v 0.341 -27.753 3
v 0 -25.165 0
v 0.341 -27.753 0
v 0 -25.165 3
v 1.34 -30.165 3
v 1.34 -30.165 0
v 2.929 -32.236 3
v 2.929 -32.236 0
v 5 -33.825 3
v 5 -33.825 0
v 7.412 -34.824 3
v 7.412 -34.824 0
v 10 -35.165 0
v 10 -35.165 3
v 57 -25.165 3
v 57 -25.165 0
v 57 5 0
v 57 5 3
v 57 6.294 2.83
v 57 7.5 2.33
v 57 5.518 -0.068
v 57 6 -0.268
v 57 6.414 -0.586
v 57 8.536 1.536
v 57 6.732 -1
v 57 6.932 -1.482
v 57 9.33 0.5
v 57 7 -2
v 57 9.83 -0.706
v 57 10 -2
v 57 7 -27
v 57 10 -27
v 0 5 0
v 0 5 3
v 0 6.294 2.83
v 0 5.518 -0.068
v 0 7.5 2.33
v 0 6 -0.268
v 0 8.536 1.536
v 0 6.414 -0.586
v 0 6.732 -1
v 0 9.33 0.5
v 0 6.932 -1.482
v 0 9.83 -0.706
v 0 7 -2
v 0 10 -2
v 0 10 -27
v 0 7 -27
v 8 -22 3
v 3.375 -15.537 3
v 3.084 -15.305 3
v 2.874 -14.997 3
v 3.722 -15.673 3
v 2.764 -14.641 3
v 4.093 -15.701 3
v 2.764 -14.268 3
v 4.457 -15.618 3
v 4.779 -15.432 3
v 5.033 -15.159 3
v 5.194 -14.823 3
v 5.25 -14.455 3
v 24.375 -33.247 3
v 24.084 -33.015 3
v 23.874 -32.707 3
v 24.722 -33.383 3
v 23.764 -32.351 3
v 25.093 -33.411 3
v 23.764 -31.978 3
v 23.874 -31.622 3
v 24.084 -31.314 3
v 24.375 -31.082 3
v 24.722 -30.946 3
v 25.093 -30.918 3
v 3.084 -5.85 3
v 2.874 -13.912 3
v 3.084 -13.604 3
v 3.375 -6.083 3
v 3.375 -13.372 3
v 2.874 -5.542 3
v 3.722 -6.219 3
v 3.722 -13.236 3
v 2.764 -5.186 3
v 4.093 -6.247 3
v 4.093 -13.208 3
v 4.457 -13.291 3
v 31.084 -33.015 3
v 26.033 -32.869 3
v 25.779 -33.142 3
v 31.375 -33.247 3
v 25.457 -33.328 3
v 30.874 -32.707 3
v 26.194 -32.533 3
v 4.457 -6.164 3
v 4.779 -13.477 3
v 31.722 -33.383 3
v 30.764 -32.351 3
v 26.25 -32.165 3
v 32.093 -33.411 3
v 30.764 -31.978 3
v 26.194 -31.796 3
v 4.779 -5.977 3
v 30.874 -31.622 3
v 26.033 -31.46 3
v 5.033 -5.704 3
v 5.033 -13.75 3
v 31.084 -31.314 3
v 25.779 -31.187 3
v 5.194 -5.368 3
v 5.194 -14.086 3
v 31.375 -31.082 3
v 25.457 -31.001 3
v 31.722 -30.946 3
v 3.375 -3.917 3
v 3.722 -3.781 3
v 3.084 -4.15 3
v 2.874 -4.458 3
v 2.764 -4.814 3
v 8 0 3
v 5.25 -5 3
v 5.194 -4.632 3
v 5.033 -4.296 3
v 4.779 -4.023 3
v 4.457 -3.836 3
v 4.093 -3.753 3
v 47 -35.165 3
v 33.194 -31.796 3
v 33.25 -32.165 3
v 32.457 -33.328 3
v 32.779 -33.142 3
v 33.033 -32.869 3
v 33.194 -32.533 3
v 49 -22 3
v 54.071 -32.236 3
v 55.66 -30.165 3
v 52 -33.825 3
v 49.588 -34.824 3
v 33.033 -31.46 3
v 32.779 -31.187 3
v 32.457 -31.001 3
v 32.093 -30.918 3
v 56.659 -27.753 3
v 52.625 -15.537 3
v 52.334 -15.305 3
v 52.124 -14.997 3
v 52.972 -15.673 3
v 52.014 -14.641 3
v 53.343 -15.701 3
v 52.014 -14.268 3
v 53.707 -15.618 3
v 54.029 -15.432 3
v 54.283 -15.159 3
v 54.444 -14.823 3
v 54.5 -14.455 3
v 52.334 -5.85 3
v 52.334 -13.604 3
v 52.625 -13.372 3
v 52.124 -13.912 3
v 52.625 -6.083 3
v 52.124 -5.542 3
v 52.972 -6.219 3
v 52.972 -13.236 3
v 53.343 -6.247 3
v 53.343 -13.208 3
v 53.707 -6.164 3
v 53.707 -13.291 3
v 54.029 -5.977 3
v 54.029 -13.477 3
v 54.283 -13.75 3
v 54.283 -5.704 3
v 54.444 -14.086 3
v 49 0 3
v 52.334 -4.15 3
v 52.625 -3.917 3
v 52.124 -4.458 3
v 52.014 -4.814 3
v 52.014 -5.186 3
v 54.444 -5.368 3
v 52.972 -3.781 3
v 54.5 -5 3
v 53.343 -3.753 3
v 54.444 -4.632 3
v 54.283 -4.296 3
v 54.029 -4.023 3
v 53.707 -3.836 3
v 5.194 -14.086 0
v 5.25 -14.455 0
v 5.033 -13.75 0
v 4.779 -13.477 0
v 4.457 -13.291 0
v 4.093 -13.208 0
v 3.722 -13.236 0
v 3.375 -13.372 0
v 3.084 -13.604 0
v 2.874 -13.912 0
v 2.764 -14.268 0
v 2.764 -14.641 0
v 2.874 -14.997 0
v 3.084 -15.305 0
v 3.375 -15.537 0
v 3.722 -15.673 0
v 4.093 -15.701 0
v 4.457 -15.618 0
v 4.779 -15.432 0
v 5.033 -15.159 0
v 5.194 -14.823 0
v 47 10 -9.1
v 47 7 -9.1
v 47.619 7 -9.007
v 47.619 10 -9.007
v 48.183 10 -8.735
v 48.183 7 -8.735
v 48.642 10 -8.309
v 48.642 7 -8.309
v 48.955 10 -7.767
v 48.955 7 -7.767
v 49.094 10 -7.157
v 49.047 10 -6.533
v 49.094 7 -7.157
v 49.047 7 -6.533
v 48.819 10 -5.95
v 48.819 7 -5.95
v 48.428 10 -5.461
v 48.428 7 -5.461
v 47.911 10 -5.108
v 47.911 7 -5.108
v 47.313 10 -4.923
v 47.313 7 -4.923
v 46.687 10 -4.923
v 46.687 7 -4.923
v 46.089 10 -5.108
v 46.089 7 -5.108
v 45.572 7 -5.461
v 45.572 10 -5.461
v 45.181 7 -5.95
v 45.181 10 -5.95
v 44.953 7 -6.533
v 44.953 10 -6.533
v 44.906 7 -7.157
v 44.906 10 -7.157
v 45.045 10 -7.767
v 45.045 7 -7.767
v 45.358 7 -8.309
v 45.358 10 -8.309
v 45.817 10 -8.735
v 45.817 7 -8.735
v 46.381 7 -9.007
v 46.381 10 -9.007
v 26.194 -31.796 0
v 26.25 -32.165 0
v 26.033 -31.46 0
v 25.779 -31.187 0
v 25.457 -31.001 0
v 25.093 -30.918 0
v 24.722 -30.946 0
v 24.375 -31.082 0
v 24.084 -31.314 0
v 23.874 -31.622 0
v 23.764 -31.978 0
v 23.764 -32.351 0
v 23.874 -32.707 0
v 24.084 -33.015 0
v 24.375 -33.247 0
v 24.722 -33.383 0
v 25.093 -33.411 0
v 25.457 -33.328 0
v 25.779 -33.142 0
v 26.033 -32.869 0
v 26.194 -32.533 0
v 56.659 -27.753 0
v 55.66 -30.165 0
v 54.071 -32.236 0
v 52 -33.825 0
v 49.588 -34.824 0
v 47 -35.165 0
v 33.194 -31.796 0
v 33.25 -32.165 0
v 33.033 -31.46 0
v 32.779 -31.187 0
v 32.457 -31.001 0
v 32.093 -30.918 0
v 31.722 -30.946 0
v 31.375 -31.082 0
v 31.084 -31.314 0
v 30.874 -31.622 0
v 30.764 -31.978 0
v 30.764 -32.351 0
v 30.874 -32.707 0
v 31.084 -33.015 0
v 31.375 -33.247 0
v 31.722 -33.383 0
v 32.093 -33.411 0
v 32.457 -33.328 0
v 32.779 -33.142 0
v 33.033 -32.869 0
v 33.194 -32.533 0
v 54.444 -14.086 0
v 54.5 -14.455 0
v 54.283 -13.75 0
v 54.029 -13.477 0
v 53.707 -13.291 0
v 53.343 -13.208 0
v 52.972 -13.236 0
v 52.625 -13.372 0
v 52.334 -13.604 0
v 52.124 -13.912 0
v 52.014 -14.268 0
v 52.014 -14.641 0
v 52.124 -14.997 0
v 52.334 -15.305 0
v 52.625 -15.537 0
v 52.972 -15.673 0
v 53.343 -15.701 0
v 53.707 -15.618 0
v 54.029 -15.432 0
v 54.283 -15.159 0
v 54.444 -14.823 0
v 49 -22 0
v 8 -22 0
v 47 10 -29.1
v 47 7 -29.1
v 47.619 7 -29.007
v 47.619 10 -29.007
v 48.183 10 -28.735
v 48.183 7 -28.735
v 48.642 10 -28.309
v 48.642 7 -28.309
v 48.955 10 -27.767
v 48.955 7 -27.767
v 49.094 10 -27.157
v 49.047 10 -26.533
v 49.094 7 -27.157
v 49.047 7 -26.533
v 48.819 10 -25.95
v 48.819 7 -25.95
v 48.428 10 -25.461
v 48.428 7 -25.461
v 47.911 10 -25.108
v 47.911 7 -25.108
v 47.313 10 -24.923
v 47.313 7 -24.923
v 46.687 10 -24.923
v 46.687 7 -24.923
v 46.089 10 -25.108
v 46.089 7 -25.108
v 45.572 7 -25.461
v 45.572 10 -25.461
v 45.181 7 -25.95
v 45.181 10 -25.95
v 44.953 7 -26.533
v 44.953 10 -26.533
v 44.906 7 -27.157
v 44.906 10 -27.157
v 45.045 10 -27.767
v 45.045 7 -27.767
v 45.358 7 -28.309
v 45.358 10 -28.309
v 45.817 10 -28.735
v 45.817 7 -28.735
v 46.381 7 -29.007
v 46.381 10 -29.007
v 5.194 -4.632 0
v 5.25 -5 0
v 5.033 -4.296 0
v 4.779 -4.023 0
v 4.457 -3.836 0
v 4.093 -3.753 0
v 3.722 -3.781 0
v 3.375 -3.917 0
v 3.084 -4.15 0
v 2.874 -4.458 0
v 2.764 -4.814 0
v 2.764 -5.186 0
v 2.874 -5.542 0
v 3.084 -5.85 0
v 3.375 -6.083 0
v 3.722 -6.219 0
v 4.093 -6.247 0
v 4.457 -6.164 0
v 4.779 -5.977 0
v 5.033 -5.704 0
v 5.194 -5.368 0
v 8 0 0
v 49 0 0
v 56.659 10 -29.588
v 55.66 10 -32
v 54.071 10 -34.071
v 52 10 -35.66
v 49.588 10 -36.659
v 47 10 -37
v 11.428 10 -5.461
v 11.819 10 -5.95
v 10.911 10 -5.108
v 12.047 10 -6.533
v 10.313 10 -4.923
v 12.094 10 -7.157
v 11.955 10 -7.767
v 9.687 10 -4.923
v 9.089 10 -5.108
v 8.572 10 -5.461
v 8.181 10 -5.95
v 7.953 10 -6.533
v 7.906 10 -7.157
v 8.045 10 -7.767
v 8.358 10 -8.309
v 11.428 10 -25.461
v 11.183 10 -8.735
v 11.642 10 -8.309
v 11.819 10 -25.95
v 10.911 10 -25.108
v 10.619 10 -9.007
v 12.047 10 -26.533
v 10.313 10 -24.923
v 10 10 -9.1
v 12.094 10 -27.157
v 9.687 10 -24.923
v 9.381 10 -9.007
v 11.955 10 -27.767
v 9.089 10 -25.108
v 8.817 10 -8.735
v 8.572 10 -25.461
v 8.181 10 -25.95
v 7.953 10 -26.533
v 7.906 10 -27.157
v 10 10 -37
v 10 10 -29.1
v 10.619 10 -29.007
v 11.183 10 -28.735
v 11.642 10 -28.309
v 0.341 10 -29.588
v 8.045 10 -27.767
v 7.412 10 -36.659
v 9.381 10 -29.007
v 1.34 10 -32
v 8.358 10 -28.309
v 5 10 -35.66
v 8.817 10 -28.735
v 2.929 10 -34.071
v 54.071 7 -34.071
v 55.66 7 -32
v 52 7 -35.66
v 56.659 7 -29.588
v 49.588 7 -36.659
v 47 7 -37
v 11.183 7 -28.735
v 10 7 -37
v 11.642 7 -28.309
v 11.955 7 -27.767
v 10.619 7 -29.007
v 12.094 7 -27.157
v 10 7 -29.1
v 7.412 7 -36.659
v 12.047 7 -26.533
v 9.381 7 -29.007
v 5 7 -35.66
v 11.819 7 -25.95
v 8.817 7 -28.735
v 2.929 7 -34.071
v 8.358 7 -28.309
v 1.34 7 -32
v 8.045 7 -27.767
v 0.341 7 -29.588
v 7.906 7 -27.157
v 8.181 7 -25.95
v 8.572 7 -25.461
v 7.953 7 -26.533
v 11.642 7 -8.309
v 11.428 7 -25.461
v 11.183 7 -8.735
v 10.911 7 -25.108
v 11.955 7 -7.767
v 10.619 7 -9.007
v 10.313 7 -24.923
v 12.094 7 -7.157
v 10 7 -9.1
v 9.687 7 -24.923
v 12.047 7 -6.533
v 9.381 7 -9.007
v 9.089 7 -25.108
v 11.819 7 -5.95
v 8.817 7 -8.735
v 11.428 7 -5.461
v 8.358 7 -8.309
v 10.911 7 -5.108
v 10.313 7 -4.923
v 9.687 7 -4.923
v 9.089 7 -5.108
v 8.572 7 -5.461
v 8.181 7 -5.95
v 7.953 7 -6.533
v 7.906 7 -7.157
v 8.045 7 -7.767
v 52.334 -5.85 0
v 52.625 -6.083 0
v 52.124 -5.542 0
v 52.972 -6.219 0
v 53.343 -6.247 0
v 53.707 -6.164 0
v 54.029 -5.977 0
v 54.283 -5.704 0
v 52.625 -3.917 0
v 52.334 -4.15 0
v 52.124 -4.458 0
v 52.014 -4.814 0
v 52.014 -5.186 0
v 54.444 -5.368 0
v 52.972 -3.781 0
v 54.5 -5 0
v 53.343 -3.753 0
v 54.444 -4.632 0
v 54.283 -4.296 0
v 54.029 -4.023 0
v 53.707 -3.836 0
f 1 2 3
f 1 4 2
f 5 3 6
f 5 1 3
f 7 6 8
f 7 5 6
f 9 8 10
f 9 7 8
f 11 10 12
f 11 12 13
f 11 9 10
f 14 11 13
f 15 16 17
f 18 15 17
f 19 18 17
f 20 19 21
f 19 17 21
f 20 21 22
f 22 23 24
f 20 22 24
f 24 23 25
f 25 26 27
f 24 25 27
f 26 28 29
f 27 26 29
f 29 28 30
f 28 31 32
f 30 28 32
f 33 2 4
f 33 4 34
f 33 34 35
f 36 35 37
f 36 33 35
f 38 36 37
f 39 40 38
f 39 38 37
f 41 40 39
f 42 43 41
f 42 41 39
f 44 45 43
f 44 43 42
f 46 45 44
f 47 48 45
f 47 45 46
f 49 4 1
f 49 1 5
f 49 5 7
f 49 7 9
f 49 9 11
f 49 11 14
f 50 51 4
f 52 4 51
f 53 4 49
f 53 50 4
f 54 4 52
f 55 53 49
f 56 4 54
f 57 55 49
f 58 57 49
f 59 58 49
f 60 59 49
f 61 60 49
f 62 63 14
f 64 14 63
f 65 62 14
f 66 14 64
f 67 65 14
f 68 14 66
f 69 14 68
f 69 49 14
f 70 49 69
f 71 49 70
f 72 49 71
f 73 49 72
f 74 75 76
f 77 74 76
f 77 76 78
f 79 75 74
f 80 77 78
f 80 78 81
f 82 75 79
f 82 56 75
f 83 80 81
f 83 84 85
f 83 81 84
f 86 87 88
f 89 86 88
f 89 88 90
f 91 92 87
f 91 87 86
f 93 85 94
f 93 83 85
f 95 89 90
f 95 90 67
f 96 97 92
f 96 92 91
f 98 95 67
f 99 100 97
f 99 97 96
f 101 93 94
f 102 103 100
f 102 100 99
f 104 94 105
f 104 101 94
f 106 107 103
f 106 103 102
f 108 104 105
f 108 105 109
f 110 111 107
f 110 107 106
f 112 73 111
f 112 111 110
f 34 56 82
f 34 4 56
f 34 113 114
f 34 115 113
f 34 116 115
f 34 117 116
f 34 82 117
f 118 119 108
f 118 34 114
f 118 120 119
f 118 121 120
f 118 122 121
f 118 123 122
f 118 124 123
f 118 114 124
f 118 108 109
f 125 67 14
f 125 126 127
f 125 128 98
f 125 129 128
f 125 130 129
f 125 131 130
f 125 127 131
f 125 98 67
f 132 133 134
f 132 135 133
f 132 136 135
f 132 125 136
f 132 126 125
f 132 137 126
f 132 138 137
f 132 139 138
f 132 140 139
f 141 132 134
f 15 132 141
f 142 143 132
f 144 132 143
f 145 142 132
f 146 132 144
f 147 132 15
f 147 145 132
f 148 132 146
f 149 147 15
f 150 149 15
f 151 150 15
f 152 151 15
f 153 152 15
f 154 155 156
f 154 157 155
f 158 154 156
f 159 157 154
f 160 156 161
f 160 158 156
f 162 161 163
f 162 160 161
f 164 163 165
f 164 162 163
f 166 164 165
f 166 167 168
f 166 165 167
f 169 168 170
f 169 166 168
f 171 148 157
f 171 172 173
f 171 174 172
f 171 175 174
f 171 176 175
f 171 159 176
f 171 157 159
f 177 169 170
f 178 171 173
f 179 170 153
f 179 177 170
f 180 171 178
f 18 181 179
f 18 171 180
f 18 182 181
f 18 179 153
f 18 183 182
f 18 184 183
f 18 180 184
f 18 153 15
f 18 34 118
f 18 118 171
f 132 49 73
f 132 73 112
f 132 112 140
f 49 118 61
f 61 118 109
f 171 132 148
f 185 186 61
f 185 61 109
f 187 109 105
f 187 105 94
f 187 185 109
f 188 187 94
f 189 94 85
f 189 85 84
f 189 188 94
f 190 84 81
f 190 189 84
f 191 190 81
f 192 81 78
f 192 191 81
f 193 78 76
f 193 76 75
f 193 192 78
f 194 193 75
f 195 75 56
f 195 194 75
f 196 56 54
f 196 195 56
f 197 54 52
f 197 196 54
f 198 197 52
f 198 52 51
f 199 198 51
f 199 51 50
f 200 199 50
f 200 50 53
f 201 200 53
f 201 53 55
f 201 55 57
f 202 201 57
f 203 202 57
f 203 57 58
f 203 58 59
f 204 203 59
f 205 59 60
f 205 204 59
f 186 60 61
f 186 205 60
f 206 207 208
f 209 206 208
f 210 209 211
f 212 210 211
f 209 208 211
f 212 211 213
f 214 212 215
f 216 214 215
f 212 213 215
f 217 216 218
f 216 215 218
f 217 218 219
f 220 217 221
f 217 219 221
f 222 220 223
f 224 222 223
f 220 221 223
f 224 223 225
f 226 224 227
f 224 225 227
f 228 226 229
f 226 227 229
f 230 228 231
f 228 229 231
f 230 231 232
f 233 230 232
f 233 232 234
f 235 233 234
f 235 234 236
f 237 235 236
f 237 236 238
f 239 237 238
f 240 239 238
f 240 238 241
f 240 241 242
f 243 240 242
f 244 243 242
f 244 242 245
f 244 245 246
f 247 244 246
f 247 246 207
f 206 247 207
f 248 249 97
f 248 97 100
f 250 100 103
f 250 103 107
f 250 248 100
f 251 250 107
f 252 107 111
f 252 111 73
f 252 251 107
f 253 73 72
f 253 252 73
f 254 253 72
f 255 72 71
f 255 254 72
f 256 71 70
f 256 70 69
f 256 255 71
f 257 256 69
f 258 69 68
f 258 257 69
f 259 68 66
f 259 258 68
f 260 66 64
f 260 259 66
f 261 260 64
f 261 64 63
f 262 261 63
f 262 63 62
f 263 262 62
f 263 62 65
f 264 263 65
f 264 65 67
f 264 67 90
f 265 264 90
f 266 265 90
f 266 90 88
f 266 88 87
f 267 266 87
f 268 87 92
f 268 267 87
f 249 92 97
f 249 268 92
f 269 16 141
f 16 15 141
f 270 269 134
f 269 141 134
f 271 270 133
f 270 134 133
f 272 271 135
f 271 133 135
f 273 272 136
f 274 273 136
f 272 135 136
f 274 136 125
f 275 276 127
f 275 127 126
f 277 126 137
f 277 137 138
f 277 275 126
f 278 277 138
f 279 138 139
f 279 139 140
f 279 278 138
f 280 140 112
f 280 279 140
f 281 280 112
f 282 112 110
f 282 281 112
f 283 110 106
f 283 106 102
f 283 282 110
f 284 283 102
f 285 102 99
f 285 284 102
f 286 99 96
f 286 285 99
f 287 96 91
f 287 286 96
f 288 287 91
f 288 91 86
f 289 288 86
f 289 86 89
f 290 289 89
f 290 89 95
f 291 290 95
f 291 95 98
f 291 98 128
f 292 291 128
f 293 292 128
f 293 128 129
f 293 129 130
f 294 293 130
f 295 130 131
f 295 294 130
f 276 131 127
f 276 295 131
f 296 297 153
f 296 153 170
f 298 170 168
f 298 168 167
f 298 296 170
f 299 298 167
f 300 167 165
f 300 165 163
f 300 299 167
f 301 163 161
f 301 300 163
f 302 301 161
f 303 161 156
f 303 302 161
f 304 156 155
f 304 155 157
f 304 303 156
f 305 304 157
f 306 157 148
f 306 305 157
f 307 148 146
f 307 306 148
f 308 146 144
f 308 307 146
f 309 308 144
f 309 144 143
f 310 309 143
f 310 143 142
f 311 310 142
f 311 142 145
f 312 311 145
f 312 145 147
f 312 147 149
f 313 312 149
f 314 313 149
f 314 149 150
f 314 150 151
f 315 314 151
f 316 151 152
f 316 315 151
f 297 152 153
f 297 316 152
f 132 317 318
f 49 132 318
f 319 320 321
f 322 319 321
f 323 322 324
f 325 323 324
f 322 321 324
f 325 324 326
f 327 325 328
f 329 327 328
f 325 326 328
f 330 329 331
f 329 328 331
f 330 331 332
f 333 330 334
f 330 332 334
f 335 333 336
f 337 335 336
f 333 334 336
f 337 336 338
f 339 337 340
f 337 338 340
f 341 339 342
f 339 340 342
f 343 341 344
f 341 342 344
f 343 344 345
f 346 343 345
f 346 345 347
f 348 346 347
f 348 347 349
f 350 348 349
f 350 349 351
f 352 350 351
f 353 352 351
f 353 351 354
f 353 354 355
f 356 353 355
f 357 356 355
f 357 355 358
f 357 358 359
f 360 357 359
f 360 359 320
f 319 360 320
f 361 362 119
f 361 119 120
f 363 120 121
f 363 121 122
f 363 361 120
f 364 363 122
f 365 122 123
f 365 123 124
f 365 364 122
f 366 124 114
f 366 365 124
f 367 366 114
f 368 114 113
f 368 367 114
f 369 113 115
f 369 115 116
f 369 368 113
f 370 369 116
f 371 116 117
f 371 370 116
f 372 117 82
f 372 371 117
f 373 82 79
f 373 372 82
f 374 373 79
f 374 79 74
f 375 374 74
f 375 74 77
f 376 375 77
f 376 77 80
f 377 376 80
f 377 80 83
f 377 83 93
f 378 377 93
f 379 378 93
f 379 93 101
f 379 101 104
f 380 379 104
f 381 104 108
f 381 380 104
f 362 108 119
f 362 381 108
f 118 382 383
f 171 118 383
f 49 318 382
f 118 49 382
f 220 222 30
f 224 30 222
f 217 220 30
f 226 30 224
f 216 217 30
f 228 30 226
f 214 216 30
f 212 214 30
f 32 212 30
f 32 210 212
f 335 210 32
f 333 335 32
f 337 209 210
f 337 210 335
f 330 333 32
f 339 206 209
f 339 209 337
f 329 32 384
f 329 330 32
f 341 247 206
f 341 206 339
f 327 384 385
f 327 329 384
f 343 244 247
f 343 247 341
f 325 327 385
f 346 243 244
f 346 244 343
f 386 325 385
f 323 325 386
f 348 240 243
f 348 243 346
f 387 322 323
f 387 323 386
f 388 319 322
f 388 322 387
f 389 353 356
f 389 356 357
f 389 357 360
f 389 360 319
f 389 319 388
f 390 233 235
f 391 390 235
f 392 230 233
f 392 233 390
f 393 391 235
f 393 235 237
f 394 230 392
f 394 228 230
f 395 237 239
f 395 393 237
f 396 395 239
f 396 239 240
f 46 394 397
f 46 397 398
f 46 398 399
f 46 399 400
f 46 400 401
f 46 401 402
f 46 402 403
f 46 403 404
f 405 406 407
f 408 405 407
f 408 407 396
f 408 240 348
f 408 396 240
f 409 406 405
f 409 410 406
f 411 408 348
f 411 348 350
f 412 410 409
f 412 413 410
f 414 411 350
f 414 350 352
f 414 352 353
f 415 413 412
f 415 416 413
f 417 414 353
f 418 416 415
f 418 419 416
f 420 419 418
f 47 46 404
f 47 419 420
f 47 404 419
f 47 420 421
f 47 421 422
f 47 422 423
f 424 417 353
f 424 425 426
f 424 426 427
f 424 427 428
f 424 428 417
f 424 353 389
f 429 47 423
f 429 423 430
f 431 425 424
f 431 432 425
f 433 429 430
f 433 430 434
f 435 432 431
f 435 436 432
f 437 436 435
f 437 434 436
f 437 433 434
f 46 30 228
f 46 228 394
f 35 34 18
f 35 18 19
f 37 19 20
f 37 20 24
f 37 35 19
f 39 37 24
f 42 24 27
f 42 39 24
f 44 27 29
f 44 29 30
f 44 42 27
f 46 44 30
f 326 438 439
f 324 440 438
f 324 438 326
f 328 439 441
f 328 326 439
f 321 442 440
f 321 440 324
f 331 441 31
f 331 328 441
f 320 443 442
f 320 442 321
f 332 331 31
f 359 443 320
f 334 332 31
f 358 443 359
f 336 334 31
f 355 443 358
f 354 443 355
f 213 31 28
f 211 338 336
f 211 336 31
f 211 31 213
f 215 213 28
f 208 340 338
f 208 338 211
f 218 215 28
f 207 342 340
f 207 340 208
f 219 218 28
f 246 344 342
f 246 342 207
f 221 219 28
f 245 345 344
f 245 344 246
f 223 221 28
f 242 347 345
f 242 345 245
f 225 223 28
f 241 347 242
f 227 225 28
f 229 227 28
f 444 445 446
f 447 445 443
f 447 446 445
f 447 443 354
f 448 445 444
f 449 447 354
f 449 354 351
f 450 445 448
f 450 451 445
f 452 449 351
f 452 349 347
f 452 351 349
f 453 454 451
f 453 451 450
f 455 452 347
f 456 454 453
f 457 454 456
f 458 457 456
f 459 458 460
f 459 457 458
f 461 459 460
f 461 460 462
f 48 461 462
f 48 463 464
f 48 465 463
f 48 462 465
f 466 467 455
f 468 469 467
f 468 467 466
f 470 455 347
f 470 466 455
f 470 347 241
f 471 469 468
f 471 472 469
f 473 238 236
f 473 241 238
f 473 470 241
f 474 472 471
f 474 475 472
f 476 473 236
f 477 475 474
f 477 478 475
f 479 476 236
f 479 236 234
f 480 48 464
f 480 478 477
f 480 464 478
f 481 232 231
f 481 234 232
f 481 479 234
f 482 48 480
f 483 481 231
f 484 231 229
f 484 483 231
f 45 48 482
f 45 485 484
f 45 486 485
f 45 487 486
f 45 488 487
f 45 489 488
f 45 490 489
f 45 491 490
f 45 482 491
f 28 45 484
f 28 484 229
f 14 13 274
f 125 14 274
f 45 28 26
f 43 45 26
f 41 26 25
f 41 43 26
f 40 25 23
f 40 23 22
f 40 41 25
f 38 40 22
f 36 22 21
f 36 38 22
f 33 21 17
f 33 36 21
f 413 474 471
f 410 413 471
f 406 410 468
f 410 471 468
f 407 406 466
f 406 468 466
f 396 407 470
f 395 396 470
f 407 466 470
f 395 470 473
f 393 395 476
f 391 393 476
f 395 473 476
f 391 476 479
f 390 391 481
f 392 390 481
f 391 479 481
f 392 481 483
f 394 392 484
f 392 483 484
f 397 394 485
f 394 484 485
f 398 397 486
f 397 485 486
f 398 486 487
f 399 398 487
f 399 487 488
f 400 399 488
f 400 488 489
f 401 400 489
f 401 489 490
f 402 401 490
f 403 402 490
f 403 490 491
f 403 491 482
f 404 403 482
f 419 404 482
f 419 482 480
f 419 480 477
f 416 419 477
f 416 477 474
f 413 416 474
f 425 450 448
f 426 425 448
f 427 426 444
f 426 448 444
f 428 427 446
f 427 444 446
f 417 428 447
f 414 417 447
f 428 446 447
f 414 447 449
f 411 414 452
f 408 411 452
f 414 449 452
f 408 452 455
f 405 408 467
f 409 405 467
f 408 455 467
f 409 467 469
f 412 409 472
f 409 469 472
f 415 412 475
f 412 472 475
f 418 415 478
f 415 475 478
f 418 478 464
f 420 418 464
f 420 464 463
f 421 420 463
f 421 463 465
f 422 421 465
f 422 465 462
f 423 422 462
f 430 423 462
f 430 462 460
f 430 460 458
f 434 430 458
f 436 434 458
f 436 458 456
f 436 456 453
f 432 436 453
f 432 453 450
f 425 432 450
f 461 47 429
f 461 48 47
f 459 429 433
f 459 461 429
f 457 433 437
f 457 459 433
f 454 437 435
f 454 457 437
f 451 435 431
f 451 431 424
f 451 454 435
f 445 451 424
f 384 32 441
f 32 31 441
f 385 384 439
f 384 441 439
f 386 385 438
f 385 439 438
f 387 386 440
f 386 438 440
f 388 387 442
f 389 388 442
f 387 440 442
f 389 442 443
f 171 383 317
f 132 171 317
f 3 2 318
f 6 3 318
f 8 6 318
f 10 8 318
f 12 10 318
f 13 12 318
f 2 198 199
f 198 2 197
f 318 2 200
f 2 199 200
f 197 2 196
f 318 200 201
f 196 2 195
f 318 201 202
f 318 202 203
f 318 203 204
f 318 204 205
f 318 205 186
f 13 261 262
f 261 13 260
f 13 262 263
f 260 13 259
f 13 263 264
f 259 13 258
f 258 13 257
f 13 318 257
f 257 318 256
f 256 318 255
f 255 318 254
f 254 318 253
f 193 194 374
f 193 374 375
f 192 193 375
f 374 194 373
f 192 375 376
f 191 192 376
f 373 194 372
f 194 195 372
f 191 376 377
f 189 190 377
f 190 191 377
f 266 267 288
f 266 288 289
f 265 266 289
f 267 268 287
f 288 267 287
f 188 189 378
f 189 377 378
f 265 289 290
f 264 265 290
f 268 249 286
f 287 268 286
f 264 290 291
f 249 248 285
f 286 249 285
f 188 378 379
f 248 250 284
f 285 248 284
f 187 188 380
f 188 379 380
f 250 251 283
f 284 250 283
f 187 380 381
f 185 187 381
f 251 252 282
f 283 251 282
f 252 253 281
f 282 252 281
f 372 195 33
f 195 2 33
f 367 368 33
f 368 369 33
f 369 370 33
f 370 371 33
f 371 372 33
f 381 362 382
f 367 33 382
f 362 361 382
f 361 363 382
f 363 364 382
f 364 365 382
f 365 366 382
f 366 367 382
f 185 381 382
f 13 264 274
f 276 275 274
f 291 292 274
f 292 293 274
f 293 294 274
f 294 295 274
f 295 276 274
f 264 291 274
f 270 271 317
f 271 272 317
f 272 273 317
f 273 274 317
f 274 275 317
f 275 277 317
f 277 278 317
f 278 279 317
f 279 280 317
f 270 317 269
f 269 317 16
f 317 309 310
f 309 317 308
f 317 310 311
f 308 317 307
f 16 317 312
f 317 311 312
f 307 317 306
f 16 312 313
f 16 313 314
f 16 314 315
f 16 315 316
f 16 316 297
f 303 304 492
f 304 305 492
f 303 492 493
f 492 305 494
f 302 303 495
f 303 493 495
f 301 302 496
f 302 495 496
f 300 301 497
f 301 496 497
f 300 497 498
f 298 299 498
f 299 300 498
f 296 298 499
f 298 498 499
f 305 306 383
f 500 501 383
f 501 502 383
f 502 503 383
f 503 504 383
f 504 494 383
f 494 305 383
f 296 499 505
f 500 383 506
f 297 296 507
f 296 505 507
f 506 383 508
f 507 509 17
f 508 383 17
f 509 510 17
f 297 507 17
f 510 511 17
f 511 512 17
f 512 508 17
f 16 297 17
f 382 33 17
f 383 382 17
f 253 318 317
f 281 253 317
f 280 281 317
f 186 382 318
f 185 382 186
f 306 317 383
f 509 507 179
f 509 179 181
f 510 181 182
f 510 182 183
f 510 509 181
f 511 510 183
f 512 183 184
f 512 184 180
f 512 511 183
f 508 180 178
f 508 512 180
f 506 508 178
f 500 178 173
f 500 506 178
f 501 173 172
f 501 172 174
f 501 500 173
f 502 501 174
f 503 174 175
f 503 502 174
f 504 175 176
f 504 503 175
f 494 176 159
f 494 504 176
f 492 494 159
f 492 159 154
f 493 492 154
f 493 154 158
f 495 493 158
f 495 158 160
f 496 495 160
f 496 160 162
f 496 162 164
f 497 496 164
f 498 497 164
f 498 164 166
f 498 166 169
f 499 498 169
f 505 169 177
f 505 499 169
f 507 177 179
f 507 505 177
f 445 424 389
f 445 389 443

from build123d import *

# Parameters (mm, degrees)
SKETCH_1_W                       = 57
SKETCH_1_H                       = 45.164593648
SKETCH_1_R                       = 1.25
EXTRUDE_1_DEPTH                  = 3
SM_EDGE_FLANGE_1_STRIP_W         = 16
SM_EDGE_FLANGE_1_STRIP_H         = 3
SM_EDGE_FLANGE_1_STRIP_CUT_DEPTH = 57
SM_EDGE_FLANGE_1_DEPTH           = 57
SKETCH_9_R                       = 2.1
CUT_EXTRUDE_1_DEPTH              = 10
FILLET_1_R                       = 10


# Sheet-metal steps are written as plain solids
with BuildPart() as part:
    # Sketch 1 → 填料-伸長1 (new body)
    with BuildSketch(Plane.XY):
        with Locations((28.5, -12.582296824)):
            Rectangle(SKETCH_1_W, SKETCH_1_H)
        Polygon((8, -22), (8, 0), (49, 0), (49, -14.454593648), (49, -22), align=None, mode=Mode.SUBTRACT)
        with Locations((25, -32.164593648)):
            Circle(SKETCH_1_R, mode=Mode.SUBTRACT)
        with Locations((4, -14.454593648)):
            Circle(SKETCH_1_R, mode=Mode.SUBTRACT)
        with Locations((32, -32.164593648)):
            Circle(SKETCH_1_R, mode=Mode.SUBTRACT)
        with Locations((53.25, -14.454593648)):
            Circle(SKETCH_1_R, mode=Mode.SUBTRACT)
        with Locations((4, -5)):
            Circle(SKETCH_1_R, mode=Mode.SUBTRACT)
        with Locations((53.25, -5)):
            Circle(SKETCH_1_R, mode=Mode.SUBTRACT)
    extrude(amount=EXTRUDE_1_DEPTH)

    # 邊線-凸緣1 strip (across the edge) → 邊線-凸緣1 strip cut (cut)
    with BuildSketch(Plane(origin=(0, 10, 0), x_dir=(0, -1, 0), z_dir=(1, 0, 0))):
        with Locations((-3, -1.5)):
            Rectangle(SM_EDGE_FLANGE_1_STRIP_W, SM_EDGE_FLANGE_1_STRIP_H)
    extrude(amount=SM_EDGE_FLANGE_1_STRIP_CUT_DEPTH, mode=Mode.SUBTRACT)

    # 邊線-凸緣1 section (across the edge) → 邊線-凸緣1 (add)
    with BuildSketch(Plane(origin=(0, 10, 0), x_dir=(0, -1, 0), z_dir=(1, 0, 0))):
        with BuildLine():
            Line((0, 2), (0, 37))
            Line((0, 37), (3, 37))
            Line((3, 37), (3, 2))
            ThreePointArc((3, 2), (3.585786438, 0.585786438), (5, 0))
            Line((5, 0), (5, -3))
            ThreePointArc((5, -3), (1.464466094, -1.535533906), (0, 2))
        make_face()
    extrude(amount=SM_EDGE_FLANGE_1_DEPTH)

    # 草圖9 → 除料-伸長1 (cut)
    with BuildSketch(Plane(origin=(0, 7, 0), x_dir=(-1, 0, 0), z_dir=(0, -1, 0))):
        with Locations(Location((-10, 27, 0), (0, 0, 90))):
            Circle(SKETCH_9_R)
        with Locations(Location((-47, 27, 0), (0, 0, 90))):
            Circle(SKETCH_9_R)
        with Locations(Location((-10, 7, 0), (0, 0, 90))):
            Circle(SKETCH_9_R)
        with Locations(Location((-47, 7, 0), (0, 0, 90))):
            Circle(SKETCH_9_R)
    extrude(amount=-CUT_EXTRUDE_1_DEPTH, mode=Mode.SUBTRACT)

    # 圓角1
    fillet_1_edges = [part.edges().sort_by_distance(p)[0] for p in [
        (57, -35.164593648, 1.5),
        (0, -35.164593648, 1.5),
        (0, 8.5, -37),
        (57, 8.5, -37),
    ]]
    fillet(fillet_1_edges, radius=FILLET_1_R)


solid = part.part
